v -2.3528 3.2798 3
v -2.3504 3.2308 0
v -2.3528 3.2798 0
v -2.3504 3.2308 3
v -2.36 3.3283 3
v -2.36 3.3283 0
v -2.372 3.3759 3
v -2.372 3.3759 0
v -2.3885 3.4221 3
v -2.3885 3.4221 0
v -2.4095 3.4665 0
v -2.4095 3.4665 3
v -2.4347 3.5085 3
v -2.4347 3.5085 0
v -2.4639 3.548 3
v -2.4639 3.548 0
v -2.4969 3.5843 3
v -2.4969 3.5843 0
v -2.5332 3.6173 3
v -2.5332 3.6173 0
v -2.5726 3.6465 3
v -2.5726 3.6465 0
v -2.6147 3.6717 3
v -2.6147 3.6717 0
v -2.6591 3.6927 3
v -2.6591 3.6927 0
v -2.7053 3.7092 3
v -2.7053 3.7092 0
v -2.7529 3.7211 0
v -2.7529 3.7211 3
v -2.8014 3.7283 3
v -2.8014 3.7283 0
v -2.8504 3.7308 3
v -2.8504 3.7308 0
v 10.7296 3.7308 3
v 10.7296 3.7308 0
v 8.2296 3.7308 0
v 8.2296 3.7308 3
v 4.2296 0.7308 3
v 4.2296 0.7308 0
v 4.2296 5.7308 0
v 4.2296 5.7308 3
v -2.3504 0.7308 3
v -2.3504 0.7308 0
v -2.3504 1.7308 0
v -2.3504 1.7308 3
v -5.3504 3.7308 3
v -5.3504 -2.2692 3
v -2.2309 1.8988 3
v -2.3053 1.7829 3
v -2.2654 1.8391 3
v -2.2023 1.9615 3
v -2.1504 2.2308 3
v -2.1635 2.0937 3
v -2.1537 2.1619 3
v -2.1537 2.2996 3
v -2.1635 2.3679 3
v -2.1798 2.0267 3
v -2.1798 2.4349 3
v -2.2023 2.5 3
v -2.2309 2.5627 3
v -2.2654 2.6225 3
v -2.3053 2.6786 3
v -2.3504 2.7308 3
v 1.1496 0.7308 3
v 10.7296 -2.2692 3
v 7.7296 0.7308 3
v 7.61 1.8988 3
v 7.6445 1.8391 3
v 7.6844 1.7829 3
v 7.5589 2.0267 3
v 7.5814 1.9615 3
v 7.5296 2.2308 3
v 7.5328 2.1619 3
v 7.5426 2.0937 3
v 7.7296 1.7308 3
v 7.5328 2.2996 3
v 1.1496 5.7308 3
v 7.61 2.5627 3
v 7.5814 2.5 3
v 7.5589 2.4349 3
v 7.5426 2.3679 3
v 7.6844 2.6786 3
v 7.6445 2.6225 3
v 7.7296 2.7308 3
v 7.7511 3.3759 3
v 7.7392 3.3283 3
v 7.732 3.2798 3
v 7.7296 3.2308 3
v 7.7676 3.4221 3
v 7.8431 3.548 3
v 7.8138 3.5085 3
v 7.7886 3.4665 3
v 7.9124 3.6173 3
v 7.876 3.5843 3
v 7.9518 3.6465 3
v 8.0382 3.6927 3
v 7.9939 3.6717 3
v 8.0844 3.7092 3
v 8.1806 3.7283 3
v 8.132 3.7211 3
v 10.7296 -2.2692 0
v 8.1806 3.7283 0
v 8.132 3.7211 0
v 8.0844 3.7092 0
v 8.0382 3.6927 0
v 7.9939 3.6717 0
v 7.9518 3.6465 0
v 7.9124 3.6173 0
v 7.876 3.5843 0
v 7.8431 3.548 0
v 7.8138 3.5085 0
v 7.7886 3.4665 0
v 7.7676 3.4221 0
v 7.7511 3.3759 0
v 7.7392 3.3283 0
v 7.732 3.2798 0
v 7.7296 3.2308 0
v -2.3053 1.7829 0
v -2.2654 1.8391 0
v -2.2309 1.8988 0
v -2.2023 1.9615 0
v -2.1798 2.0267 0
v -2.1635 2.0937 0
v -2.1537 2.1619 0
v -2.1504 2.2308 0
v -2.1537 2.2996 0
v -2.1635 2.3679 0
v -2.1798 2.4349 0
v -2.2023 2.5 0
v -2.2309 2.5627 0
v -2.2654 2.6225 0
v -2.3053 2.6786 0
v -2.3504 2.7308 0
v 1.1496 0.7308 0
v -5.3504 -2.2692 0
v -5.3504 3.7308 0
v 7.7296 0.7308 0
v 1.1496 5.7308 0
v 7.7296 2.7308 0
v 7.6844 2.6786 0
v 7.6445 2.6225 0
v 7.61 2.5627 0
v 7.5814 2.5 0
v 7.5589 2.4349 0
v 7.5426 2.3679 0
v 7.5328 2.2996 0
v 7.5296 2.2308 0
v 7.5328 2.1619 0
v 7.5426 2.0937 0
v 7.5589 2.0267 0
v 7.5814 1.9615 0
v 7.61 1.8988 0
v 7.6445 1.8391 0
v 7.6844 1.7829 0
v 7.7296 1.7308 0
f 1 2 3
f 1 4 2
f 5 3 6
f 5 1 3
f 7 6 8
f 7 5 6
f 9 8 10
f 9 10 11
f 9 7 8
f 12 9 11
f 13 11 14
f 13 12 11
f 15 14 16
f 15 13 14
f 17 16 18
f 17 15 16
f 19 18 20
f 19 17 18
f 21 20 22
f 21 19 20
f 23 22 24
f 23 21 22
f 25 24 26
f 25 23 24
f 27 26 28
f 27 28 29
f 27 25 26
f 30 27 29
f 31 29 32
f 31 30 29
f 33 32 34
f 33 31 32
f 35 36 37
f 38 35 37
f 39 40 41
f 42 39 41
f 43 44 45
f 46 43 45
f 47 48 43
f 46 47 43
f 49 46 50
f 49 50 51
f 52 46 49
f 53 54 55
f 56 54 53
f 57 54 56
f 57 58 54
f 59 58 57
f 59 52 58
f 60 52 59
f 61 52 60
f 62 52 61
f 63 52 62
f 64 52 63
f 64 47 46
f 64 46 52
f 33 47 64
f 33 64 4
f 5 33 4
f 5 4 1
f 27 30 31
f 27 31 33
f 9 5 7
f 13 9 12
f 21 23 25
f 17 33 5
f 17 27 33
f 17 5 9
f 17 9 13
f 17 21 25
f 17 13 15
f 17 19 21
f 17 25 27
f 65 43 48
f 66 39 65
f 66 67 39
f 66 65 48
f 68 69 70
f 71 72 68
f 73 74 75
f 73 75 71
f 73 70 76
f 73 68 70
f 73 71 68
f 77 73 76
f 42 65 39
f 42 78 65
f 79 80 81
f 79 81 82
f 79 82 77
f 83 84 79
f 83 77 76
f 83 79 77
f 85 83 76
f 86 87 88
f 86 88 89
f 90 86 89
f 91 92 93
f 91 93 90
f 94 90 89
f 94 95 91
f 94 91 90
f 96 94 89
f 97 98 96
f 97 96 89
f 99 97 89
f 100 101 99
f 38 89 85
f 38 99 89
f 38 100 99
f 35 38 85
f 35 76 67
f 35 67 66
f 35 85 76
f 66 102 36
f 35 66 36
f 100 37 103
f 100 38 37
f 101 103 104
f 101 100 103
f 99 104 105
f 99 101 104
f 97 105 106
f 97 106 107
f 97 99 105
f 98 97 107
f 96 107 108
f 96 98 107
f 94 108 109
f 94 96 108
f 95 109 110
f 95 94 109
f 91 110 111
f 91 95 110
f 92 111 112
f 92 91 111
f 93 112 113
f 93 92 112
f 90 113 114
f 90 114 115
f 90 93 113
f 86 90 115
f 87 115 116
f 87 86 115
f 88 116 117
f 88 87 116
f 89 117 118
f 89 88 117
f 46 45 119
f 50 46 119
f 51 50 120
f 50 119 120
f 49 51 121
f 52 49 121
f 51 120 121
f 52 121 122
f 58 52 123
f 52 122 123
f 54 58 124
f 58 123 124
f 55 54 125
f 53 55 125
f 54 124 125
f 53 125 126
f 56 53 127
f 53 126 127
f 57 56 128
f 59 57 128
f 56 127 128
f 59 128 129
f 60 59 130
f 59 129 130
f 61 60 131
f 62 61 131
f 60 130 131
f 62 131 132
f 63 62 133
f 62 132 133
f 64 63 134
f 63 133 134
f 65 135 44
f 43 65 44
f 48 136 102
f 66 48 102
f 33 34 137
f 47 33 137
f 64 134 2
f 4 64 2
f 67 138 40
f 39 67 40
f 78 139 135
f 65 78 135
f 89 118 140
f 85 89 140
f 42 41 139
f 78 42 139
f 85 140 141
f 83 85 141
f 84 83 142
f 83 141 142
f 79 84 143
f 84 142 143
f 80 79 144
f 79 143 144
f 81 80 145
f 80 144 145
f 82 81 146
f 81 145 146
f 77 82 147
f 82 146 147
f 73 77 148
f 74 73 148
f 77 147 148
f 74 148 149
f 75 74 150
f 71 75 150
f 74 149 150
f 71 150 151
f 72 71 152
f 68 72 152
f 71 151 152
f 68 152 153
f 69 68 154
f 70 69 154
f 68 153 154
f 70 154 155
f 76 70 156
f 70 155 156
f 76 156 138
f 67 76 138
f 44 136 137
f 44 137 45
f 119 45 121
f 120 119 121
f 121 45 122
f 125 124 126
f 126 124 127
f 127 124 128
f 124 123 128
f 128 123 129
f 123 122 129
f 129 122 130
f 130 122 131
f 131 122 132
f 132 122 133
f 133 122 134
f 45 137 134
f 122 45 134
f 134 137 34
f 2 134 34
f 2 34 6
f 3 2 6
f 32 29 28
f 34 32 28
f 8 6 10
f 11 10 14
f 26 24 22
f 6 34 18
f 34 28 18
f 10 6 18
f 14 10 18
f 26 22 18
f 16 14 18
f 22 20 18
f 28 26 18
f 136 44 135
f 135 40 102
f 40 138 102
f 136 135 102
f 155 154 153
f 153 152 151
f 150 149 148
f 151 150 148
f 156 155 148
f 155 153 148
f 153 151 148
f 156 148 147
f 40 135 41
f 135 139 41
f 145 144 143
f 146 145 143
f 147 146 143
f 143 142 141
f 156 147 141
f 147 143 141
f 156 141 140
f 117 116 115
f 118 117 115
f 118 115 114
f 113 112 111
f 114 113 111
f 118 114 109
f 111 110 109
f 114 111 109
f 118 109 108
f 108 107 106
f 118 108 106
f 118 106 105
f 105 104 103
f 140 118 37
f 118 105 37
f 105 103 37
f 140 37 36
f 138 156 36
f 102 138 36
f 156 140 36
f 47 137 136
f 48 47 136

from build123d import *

# Parameters (mm, degrees)
BOSS_EXTRUDE1_DEPTH = 3
FILLET1_R           = 0.5


with BuildPart() as part:
    # Sketch1 → Boss-Extrude1 (new body)
    with BuildSketch(Plane.XY):
        with BuildLine():
            Line((-5.350435009, -2.26924573), (10.729564991, -2.26924573))
            Line((10.729564991, -2.26924573), (10.729564991, 3.73075427))
            Line((10.729564991, 3.73075427), (7.729564991, 3.73075427))
            Line((7.729564991, 3.73075427), (7.729564991, 2.73075427))
            ThreePointArc((7.729564991, 2.73075427), (7.529564991, 2.23075427), (7.729564991, 1.73075427))
            Line((7.729564991, 1.73075427), (7.729564991, 0.73075427))
            Line((7.729564991, 0.73075427), (4.229564991, 0.73075427))
            Line((4.229564991, 0.73075427), (4.229564991, 5.73075427))
            Line((4.229564991, 5.73075427), (1.149564991, 5.73075427))
            Line((1.149564991, 5.73075427), (1.149564991, 0.73075427))
            Line((1.149564991, 0.73075427), (-2.350435009, 0.73075427))
            Line((-2.350435009, 0.73075427), (-2.350435009, 1.73075427))
            ThreePointArc((-2.350435009, 1.73075427), (-2.150435009, 2.23075427), (-2.350435009, 2.73075427))
            Line((-2.350435009, 2.73075427), (-2.350435009, 3.73075427))
            Line((-2.350435009, 3.73075427), (-5.350435009, 3.73075427))
            Line((-5.350435009, 3.73075427), (-5.350435009, -2.26924573))
        make_face()
    extrude(amount=BOSS_EXTRUDE1_DEPTH)

    # Fillet1
    fillet1_edges = [part.edges().sort_by_distance(p)[0] for p in [
        (-2.350435009, 3.73075427, 1.5),
        (7.729564991, 3.73075427, 1.5),
    ]]
    fillet(fillet1_edges, radius=FILLET1_R)


solid = part.part
